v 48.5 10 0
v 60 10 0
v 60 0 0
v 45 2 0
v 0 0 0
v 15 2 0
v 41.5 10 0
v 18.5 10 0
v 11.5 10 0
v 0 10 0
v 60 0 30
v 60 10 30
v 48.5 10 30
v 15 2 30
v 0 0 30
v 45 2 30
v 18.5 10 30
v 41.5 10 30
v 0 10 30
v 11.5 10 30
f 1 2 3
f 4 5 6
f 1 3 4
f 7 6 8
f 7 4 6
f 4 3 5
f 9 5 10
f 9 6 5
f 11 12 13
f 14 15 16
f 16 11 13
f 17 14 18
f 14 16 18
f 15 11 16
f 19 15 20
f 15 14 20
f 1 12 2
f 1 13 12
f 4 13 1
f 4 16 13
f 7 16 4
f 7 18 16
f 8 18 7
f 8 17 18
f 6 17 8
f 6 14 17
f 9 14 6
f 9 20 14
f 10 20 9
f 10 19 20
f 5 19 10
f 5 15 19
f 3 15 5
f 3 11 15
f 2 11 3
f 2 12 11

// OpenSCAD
$fn = 32;

// ----------------------------------------------------------------------
// V guide rail: doublev, 60 mm wide
// ----------------------------------------------------------------------

// --- parameters (mm) ---
rail_w = 60;              // rail width, X
base_t = 10;              // base plate thickness
v_depth = 8;              // V feature depth / height
v_half_w = 7;             // half width of the V at the base face
plate_t = 30;             // rail length, Z (the extrusion height)
groove_off = 15;          // offset of each groove from the centreline

centre_x = rail_w / 2;  // rail centreline
groove_a = centre_x - groove_off;  // axis of the first groove
groove_b = centre_x + groove_off;  // axis of the second groove

profile = [[0, 0], [60, 0], [60, 10], [48.5, 10], [45, 2], [41.5, 10], [18.5, 10], [15, 2], [11.5, 10], [0, 10]];  // primary outline, 10 points, counter clockwise

// --- the one profile operation ---
linear_extrude(height = plate_t) polygon(points = profile);
